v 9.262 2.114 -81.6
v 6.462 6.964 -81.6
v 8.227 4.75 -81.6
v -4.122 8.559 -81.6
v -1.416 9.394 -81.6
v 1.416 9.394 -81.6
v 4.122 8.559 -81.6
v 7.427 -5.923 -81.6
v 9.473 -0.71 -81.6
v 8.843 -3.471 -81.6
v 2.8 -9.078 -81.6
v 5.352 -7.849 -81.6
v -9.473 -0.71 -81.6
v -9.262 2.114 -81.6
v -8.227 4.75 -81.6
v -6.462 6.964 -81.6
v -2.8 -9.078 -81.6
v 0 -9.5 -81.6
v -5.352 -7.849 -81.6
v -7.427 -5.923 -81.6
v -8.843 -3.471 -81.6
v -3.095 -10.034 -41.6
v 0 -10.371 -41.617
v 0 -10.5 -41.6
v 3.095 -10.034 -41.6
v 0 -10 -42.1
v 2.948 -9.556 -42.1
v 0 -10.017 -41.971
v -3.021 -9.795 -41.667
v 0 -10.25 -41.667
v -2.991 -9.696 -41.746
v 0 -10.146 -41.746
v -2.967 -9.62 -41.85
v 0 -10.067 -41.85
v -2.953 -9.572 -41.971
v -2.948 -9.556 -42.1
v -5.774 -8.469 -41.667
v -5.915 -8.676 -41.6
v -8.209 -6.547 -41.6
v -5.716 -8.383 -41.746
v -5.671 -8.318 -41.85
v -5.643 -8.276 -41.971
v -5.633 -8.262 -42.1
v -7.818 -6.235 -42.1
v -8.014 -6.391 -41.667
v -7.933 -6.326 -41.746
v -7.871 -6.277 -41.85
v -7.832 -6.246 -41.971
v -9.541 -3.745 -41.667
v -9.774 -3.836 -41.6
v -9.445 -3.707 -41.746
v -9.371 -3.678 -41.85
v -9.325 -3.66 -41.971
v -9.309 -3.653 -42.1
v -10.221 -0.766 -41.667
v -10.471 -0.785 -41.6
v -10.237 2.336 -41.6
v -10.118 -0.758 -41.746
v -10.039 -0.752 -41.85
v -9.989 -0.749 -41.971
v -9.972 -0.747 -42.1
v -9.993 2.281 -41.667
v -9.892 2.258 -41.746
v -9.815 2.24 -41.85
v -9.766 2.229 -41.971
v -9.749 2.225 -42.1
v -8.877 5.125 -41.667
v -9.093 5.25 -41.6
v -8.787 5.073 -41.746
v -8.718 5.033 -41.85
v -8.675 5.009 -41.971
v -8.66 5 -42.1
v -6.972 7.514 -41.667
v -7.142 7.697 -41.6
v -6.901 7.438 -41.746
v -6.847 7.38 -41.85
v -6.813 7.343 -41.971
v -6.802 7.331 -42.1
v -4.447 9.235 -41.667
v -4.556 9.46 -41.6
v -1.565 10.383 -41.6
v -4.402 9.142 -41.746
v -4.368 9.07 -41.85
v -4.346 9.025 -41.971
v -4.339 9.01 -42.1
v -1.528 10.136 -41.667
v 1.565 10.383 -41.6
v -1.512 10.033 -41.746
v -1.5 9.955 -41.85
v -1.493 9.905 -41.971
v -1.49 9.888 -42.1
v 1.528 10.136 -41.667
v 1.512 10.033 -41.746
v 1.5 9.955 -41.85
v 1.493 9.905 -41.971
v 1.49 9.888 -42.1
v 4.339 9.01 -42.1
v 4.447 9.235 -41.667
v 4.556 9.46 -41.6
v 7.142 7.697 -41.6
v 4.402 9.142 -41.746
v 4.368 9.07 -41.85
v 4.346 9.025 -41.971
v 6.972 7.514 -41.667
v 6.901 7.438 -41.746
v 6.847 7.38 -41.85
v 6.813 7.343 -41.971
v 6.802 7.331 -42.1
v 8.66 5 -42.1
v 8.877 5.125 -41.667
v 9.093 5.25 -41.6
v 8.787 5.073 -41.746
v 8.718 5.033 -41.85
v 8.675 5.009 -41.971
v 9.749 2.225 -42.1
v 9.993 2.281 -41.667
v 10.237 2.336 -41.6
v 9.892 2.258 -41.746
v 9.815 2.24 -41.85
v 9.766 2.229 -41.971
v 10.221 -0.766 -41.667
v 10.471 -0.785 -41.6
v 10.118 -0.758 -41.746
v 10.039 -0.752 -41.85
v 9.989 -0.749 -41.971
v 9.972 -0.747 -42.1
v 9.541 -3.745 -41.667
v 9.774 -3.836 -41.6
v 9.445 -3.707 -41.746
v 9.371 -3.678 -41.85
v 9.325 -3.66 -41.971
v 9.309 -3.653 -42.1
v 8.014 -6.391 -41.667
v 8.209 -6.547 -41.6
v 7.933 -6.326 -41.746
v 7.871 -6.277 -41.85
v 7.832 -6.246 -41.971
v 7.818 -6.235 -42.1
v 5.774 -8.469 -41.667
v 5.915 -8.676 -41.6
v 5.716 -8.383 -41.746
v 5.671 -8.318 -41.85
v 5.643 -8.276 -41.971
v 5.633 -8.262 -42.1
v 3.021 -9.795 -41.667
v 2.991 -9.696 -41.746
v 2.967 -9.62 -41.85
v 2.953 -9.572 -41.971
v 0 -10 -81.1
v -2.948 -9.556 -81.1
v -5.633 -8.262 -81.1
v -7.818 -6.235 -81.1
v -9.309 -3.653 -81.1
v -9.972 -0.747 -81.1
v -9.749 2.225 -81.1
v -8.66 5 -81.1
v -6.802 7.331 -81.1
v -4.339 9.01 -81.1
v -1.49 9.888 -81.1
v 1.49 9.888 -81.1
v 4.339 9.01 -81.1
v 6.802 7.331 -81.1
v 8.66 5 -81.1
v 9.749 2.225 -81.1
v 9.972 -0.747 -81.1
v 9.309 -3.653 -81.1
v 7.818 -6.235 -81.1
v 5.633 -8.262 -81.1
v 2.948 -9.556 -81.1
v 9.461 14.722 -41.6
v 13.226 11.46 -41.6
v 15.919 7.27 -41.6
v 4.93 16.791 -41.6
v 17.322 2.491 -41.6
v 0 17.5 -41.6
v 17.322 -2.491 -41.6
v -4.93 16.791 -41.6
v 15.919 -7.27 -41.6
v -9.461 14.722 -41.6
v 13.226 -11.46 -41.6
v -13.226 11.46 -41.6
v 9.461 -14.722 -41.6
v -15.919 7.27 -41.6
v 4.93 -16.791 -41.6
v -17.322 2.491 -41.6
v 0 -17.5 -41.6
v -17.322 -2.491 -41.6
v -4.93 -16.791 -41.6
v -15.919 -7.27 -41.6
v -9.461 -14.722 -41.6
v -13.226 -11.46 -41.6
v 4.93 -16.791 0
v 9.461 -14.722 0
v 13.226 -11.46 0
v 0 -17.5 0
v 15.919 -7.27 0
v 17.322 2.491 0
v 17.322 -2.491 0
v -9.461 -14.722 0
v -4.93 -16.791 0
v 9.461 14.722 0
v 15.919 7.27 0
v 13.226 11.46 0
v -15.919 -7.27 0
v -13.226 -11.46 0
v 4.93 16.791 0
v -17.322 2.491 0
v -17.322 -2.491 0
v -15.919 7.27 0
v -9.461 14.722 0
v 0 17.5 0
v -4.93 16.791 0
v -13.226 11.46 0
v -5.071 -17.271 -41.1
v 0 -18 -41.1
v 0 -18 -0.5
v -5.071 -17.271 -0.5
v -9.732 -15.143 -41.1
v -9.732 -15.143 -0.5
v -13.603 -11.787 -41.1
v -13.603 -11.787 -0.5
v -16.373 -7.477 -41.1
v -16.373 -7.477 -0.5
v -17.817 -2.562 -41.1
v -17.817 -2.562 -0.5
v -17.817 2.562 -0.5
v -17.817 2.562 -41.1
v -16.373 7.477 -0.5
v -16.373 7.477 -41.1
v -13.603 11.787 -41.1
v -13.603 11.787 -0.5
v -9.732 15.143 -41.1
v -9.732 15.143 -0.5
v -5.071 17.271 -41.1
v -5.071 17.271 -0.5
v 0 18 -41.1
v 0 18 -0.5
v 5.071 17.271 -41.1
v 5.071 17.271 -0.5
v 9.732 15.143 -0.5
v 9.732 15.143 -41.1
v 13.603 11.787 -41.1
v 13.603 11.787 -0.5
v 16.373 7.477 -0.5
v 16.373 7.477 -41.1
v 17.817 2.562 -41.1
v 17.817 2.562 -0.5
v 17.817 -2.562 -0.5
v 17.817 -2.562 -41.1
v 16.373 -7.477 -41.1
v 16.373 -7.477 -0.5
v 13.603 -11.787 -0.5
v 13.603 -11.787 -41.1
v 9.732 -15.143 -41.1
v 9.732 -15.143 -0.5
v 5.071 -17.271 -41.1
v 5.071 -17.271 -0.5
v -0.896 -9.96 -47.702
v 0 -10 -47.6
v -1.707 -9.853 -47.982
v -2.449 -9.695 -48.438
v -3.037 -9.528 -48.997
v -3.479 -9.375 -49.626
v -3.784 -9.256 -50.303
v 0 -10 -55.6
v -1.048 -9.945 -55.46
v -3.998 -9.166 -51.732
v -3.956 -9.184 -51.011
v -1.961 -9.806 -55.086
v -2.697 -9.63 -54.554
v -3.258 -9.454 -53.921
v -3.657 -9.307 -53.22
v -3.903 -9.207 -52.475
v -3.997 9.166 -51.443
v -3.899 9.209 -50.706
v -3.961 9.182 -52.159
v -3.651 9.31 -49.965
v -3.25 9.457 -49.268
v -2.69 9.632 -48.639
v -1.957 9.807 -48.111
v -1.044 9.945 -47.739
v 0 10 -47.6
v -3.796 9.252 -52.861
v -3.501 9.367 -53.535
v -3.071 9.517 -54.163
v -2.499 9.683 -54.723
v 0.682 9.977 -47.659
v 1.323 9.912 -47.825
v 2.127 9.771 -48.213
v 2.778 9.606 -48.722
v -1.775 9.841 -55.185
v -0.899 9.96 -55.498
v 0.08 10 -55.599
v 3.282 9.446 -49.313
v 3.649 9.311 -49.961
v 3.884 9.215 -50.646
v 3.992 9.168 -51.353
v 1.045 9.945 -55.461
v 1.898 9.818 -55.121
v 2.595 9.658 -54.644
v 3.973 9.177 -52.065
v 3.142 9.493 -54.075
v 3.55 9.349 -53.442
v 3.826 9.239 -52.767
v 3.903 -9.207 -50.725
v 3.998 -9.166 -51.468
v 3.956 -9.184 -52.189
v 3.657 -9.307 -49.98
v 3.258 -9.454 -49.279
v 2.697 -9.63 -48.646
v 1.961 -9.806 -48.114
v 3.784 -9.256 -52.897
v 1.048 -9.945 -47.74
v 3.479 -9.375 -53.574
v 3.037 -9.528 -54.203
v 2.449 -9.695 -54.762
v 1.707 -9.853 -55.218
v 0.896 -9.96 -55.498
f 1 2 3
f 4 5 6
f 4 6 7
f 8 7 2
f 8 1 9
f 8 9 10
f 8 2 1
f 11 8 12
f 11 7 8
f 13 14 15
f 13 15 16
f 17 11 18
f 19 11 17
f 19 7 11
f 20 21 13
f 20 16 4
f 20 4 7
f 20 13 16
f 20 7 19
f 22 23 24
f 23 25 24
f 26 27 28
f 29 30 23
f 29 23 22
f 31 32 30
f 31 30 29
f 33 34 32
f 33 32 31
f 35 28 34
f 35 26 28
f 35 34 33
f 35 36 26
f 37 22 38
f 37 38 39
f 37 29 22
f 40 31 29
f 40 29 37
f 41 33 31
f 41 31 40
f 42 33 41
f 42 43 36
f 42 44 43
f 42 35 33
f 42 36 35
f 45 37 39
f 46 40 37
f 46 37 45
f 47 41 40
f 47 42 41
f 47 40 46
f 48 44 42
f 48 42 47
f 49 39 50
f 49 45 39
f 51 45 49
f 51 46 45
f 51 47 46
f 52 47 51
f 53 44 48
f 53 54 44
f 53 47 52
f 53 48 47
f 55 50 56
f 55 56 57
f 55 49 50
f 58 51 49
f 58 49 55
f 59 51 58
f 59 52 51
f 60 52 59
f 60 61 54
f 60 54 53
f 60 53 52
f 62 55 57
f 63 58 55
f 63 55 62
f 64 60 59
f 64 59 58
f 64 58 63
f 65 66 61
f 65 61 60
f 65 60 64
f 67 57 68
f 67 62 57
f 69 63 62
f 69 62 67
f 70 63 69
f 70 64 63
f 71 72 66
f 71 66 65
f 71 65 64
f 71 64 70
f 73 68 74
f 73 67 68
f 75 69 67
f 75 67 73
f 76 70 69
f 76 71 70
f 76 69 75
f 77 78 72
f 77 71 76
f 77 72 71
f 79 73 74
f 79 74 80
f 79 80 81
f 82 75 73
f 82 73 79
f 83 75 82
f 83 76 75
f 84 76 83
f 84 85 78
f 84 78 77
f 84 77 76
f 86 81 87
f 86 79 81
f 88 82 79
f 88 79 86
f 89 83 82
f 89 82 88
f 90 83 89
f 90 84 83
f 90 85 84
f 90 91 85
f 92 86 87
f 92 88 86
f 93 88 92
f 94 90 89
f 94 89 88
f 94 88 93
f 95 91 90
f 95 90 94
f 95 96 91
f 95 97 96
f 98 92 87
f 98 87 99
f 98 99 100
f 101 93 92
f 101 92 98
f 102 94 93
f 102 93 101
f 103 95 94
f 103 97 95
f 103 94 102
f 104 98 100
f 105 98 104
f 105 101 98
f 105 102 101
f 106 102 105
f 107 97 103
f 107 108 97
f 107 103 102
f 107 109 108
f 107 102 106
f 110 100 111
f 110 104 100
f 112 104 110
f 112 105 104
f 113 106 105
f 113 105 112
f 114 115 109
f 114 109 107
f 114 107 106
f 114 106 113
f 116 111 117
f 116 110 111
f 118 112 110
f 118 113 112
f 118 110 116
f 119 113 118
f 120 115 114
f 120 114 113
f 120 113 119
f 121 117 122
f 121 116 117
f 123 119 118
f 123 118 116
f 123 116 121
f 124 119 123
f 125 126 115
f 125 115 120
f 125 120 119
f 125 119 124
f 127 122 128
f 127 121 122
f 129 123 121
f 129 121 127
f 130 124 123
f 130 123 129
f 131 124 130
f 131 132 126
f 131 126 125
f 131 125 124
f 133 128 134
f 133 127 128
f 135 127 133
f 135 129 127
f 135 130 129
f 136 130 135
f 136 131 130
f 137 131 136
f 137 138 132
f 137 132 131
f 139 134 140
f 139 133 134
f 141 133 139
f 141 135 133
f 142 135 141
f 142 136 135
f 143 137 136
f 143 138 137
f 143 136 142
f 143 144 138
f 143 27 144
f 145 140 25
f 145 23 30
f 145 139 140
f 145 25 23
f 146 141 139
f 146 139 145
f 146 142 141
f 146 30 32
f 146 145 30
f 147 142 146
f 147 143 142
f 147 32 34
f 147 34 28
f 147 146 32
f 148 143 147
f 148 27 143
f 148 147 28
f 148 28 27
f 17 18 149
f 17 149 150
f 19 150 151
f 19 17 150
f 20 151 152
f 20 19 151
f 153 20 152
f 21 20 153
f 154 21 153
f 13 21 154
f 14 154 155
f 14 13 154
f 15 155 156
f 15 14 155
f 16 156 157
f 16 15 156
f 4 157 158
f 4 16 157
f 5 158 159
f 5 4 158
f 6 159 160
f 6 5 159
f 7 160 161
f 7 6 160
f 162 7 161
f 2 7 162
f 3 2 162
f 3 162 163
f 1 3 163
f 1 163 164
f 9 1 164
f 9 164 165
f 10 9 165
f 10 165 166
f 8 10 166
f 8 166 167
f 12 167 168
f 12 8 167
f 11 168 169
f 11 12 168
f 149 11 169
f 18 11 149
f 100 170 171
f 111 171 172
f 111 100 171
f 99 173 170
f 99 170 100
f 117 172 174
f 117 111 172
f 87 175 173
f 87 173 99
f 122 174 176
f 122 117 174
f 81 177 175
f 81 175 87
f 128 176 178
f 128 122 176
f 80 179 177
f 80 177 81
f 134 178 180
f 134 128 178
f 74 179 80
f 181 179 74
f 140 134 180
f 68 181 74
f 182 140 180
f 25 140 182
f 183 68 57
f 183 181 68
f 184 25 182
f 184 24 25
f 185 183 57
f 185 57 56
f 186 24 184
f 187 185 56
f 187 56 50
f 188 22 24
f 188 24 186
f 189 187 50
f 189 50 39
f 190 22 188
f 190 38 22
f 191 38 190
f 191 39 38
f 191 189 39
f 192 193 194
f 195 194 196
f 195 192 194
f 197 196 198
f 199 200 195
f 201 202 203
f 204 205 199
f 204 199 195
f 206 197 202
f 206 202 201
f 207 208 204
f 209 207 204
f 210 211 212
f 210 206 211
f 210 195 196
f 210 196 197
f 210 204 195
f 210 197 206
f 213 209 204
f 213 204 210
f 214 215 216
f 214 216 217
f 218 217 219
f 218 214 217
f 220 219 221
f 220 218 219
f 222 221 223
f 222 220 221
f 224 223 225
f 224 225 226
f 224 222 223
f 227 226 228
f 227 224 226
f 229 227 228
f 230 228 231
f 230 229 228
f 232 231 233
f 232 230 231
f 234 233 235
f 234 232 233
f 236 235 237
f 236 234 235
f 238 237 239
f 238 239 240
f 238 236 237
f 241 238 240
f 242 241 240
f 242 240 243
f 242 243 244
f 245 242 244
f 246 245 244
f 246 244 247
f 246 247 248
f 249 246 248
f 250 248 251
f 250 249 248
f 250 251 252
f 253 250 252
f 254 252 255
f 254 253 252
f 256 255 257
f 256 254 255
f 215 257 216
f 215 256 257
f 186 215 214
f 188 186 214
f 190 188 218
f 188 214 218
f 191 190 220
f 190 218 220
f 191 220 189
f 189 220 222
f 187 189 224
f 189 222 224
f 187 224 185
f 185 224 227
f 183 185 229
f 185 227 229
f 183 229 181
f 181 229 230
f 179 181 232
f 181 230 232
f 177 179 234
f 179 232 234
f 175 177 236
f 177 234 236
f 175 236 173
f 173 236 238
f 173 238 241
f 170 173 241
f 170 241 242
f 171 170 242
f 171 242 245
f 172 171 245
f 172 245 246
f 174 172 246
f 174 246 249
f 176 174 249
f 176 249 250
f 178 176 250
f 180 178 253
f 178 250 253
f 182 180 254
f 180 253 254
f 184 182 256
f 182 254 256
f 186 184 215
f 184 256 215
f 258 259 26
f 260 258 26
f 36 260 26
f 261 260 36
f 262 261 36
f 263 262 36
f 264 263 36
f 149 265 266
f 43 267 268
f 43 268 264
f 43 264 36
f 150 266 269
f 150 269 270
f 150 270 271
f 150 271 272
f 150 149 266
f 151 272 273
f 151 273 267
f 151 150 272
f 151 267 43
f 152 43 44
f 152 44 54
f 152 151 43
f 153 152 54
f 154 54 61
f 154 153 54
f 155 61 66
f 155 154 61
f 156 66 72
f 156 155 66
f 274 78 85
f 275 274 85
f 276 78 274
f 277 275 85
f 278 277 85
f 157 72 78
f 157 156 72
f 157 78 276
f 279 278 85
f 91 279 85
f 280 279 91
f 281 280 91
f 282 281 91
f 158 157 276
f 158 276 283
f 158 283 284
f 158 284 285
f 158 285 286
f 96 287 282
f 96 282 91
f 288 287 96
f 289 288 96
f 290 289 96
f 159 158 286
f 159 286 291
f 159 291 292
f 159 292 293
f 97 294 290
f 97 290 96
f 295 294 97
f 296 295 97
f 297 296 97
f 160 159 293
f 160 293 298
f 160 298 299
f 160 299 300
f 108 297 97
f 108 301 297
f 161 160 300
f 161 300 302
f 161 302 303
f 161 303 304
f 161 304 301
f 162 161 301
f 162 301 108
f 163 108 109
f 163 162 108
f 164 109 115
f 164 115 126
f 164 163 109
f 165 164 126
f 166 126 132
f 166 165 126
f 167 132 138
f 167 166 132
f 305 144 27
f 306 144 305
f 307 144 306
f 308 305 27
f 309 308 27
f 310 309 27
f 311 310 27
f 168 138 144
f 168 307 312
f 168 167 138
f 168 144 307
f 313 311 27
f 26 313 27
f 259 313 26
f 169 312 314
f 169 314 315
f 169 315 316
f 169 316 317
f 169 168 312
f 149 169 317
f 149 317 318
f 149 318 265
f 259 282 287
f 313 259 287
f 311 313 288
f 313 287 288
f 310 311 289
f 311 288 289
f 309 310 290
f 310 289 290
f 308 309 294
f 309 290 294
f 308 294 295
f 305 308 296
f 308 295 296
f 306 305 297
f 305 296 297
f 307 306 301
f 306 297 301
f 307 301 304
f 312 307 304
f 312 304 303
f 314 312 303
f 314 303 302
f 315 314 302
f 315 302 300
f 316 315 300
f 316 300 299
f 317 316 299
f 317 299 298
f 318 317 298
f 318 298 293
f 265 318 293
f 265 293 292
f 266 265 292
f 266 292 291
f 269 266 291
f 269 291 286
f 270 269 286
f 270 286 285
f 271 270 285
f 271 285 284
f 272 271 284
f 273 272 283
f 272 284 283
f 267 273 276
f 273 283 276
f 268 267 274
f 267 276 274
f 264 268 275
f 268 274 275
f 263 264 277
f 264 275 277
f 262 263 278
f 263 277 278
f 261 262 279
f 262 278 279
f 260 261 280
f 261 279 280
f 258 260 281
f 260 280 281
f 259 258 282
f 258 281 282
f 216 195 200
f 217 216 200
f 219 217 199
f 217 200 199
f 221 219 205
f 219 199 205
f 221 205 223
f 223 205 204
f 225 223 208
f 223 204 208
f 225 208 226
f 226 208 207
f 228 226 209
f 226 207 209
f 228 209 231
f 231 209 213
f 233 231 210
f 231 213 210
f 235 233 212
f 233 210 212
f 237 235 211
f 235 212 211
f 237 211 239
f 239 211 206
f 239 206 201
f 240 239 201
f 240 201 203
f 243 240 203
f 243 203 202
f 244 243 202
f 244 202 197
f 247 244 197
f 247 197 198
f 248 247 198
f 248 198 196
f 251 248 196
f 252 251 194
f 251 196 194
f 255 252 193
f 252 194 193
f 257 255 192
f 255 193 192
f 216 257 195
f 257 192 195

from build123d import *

# Parameters (mm, degrees)
SKETCH_2_R          = 4
CUT_EXTRUDE_1_DEPTH = 89.128088598
FILLET_1_R          = 0.5
CHAMFER_1_SIZE      = 0.5


with BuildPart() as part:
    # Эскиз1 → Повернуть1 (revolve)
    with BuildSketch(Plane(origin=(0, 0, 0), x_dir=(0, 0, -1), z_dir=(1, 0, 0)), mode=Mode.PRIVATE) as revolve_1_sk:
        Polygon((0, 0), (0, 18), (41.6, 18), (41.6, 10), (81.6, 10), (81.6, 0), align=None)
    revolve(revolve_1_sk.sketch.rotate(Axis((0, 0, 0), (0, 0, -1)), 180), axis=Axis((0, 0, 0), (0, 0, -1)))

    # Эскиз2 → Вырез-Вытянуть1 (cut, through all)
    with BuildSketch(Plane(origin=(0, 10, 0), x_dir=(1, 0, 0), z_dir=(0, 1, 0))):
        with Locations(Location((0, 51.6, 0), (0, 0, 269.999999991))):
            Circle(SKETCH_2_R)
    extrude(amount=-CUT_EXTRUDE_1_DEPTH, mode=Mode.SUBTRACT)

    # Скругление1
    fillet_1_edges = [part.edges().sort_by_distance(p)[0] for p in [
        (0, 10, -41.6),
    ]]
    fillet(fillet_1_edges, radius=FILLET_1_R)

    # Фаска1
    chamfer_1_edges = [part.edges().sort_by_distance(p)[0] for p in [
        (0, 10, -81.6),
        (0, 18, -41.6),
        (0, 18, 0),
    ]]
    chamfer(chamfer_1_edges, length=CHAMFER_1_SIZE)


solid = part.part
